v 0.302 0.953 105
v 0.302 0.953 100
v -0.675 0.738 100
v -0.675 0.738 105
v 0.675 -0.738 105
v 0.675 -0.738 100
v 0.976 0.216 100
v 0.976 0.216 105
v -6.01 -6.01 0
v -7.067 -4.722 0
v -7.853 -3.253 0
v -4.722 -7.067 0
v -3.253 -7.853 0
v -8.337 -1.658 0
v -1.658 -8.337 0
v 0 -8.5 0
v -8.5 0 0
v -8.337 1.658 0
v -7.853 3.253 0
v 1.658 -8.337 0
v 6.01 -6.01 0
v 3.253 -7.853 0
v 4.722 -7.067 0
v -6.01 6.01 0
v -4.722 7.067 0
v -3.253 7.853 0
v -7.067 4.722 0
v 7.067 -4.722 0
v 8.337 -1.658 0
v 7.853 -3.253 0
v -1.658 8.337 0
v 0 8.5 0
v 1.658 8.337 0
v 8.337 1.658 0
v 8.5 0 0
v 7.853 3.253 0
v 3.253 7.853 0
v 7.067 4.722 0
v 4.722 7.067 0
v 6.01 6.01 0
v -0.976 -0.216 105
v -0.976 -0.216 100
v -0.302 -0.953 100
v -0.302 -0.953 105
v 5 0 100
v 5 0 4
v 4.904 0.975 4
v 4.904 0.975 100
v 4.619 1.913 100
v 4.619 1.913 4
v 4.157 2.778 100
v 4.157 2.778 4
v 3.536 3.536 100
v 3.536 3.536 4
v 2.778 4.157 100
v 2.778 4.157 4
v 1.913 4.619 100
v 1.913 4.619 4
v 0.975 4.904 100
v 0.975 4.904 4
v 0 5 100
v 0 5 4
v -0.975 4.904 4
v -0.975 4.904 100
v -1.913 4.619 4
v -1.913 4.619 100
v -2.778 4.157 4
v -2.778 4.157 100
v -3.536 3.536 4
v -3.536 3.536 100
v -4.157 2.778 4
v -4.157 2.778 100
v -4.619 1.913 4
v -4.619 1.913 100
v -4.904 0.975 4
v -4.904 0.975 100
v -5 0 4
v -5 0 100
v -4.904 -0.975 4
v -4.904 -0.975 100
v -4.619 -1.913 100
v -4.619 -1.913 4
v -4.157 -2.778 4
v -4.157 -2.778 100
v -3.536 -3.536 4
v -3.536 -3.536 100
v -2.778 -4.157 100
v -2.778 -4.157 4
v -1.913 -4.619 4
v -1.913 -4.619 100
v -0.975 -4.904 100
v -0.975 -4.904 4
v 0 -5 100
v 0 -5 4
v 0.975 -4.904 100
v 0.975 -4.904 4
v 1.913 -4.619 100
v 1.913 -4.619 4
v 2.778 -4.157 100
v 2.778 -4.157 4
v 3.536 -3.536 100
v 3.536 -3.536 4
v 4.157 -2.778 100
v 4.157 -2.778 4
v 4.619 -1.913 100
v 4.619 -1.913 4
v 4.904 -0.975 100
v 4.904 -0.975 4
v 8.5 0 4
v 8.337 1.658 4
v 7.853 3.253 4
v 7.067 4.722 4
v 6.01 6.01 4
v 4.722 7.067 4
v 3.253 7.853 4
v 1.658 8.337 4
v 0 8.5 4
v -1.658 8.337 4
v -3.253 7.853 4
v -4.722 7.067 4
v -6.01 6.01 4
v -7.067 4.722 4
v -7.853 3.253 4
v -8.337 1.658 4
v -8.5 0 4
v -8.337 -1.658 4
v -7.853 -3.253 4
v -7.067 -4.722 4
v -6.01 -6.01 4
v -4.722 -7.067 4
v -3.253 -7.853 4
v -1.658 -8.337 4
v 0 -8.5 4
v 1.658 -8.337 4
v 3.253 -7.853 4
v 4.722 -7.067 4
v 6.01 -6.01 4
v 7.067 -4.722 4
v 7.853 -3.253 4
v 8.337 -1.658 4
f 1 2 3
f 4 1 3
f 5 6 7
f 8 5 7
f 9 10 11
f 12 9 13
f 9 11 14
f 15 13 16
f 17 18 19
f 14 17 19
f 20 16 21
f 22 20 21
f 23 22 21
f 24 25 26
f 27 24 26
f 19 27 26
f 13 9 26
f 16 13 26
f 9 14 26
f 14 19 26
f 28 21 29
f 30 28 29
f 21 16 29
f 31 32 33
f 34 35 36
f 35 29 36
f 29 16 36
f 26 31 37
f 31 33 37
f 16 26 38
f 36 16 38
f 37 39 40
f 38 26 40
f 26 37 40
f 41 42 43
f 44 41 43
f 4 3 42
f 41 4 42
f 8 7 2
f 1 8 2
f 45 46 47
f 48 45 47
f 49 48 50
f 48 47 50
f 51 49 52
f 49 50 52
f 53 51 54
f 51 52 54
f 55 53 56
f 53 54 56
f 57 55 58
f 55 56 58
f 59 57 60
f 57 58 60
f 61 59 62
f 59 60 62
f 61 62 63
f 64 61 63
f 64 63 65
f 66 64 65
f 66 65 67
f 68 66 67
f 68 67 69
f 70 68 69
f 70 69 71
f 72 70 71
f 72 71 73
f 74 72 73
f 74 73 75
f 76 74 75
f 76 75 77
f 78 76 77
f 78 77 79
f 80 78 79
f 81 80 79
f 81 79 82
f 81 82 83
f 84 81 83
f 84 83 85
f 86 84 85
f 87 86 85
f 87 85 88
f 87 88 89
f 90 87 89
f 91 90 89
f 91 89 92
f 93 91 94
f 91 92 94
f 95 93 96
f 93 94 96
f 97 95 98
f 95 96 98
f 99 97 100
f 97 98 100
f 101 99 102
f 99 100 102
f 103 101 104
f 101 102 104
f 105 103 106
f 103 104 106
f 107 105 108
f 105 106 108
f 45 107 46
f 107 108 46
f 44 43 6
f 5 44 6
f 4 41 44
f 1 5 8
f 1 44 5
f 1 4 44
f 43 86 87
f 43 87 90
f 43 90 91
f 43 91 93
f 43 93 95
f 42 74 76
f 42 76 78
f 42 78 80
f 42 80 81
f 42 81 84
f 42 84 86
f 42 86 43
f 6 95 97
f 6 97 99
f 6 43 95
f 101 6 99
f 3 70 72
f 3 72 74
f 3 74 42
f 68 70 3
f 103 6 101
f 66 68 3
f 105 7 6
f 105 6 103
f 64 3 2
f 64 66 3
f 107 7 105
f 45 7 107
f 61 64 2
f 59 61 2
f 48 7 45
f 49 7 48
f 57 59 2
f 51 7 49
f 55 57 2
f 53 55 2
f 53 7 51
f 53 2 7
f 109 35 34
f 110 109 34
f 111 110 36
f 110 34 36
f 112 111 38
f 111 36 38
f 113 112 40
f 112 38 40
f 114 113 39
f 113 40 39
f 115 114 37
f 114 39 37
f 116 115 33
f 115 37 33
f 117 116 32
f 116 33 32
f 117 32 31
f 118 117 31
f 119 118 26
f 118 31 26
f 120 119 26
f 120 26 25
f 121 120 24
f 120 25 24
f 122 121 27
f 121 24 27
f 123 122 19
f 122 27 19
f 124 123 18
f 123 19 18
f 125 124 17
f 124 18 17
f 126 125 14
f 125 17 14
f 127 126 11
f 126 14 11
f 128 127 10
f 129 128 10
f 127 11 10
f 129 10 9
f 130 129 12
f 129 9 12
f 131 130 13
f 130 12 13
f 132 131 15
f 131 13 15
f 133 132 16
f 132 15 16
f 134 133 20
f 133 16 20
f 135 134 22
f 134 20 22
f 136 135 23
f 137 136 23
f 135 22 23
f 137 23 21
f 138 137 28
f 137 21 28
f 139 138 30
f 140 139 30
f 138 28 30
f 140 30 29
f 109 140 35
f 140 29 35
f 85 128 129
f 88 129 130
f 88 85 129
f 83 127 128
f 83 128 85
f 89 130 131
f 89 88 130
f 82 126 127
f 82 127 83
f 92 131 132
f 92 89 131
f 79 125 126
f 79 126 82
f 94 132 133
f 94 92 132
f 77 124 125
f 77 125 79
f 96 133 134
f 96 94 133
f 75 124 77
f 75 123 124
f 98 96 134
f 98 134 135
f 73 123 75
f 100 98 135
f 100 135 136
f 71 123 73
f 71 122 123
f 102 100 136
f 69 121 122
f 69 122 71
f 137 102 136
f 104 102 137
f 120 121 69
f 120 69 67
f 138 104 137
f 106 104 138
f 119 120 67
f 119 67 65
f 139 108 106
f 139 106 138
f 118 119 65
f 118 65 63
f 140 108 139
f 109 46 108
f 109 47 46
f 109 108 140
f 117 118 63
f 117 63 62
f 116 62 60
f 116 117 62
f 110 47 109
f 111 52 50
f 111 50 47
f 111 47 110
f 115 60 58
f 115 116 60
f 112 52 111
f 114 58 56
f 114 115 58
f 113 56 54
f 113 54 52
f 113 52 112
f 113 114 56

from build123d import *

# Parameters (mm, degrees)
F0_R     = 8.5
F1_DEPTH = 4
F2_R     = 5
F3_DEPTH = 100
F5_DEPTH = 5


with BuildPart() as f1:
    # F0 (on Top) → F1 (new body)
    with BuildSketch(Plane.XY):
        Circle(F0_R)
    extrude(amount=F1_DEPTH)

    # F2 (on Top) → F3 (join)
    with BuildSketch(Plane.XY):
        Circle(F2_R)
    extrude(amount=F3_DEPTH)

    # F4 (on face) → F5 (join)
    with BuildSketch(Plane.XY.offset(100)):
        Polygon((0.674898, -0.737911), (0.976499, 0.215523), (0.301601, 0.953434), (-0.674898, 0.737911), (-0.976499, -0.215523), (-0.301601, -0.953434), align=None)
    extrude(amount=F5_DEPTH)


solid = f1.part
